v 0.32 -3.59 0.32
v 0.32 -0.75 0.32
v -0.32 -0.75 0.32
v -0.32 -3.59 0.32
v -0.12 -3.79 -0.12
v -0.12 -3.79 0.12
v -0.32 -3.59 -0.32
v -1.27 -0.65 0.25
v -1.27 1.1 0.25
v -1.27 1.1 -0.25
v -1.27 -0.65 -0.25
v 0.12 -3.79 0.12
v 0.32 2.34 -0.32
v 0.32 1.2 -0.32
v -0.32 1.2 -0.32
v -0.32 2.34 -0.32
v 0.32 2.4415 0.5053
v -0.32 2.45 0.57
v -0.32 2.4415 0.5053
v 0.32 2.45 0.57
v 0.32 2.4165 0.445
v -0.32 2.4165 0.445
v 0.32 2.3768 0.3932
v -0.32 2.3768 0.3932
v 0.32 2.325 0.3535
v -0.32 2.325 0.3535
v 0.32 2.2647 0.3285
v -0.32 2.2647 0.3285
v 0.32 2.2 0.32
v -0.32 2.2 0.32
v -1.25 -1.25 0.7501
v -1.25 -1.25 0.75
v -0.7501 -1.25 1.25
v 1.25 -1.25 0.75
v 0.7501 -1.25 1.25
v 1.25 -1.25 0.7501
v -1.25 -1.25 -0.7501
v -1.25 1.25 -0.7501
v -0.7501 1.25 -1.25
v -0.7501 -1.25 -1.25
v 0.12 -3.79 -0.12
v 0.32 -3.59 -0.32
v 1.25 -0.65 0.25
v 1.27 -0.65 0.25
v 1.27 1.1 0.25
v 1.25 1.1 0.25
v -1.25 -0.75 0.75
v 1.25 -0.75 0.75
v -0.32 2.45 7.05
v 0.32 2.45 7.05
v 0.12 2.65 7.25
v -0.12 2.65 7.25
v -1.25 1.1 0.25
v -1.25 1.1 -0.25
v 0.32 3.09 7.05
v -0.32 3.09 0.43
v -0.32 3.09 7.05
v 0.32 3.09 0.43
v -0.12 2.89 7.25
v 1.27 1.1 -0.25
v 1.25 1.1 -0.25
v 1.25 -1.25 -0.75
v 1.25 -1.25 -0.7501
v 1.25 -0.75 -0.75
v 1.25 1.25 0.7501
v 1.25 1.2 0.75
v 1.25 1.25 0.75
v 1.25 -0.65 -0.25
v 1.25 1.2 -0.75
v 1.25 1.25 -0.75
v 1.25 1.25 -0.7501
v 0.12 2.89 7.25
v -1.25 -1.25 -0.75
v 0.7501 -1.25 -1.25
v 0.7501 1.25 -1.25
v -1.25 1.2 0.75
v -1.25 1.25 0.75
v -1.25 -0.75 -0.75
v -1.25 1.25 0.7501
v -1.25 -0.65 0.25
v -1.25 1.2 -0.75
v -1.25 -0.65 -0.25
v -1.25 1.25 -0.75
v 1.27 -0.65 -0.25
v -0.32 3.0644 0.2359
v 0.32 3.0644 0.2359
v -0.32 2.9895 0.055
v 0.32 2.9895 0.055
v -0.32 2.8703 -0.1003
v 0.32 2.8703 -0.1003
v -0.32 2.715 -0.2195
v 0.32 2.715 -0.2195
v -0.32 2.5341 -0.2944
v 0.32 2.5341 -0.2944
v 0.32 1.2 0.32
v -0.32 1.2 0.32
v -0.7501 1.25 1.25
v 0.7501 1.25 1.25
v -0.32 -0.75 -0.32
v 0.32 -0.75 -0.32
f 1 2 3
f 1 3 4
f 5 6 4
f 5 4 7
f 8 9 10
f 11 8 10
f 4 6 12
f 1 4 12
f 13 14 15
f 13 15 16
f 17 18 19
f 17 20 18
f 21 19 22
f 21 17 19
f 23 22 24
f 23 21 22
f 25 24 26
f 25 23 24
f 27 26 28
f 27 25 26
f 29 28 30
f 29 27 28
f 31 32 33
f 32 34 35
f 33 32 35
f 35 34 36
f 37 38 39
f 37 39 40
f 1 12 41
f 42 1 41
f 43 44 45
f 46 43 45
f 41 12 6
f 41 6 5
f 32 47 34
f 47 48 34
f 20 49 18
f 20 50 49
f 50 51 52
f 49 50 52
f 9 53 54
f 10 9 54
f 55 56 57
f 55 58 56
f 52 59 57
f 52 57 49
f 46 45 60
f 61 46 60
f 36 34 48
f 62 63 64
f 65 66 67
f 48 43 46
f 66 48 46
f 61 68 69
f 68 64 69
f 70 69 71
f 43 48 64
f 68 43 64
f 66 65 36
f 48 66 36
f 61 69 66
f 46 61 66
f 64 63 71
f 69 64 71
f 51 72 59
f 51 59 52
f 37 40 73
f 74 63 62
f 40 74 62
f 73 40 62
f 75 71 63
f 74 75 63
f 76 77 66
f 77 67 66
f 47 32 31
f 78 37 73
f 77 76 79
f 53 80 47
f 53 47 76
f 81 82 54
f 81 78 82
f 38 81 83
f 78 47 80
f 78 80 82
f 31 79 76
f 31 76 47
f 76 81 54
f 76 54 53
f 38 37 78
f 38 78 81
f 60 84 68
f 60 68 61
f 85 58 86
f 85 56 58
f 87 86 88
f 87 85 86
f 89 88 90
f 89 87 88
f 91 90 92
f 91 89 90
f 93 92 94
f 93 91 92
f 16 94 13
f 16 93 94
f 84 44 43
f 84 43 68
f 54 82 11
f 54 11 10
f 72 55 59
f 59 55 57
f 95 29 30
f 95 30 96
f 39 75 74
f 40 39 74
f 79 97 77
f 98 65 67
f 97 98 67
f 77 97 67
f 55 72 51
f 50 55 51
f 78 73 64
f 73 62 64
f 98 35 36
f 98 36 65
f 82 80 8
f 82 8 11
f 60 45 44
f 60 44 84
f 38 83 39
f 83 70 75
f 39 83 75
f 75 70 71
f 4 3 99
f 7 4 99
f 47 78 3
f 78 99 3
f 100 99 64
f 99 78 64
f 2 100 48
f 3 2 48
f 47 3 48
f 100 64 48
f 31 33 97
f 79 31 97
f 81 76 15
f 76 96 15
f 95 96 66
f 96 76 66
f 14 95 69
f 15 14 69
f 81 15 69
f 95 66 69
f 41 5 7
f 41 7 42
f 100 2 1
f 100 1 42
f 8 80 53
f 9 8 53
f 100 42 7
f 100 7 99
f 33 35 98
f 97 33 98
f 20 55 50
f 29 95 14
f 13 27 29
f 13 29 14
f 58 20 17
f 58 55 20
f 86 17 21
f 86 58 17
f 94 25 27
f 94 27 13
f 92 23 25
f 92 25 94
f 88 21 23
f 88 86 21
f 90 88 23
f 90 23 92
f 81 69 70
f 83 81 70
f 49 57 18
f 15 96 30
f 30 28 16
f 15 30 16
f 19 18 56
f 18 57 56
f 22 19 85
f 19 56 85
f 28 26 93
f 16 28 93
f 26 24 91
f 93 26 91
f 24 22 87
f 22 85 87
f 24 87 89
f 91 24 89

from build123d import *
from OCP.BRepFilletAPI import BRepFilletAPI_MakeFillet

# Parameters (mm, degrees)
BOSS_EXTRUDE1_DEPTH = 0.32
FILLET1_R1          = 0.75
FILLET1_R2          = 0.25
BOSS_EXTRUDE3_DEPTH = 1.25
CHAMFER1_SIZE       = 0.5
SKETCH3_W           = 0.5
SKETCH3_H           = 1.75
BOSS_EXTRUDE4_DEPTH = 1.27
CHAMFER2_SIZE       = 0.2


with BuildPart() as part:
    # Sketch1 → Boss-Extrude1 (new, symmetric)
    with BuildSketch(Plane(origin=(0, 0, 0), x_dir=(0, 0, -1), z_dir=(1, 0, 0))):
        Polygon((-7.25, 2.45), (-0.32, 2.45), (-0.32, -3.79), (0.32, -3.79), (0.32, 3.09), (-7.25, 3.09), align=None)
    extrude(amount=BOSS_EXTRUDE1_DEPTH, both=True)

    # Fillet1: one fillet with a radius per group of edges: ONE call of the kernel's fillet builder (fillet() takes one radius for all edges)
    fillet1_edges_1 = [part.edges().sort_by_distance(p)[0] for p in [
        (0, 3.09, -0.32),
    ]]
    fillet1_edges_2 = [part.edges().sort_by_distance(p)[0] for p in [
        (0, 2.45, 0.32),
    ]]
    fillet1 = BRepFilletAPI_MakeFillet(part.part.solid().wrapped)
    for e in fillet1_edges_1:
        fillet1.Add(FILLET1_R1, e.wrapped)
    for e in fillet1_edges_2:
        fillet1.Add(FILLET1_R2, e.wrapped)
    add(Compound.cast(fillet1.Shape()), mode=Mode.REPLACE)

    # Sketch2 → Boss-Extrude3 (add, symmetric)
    with BuildSketch(Plane(origin=(0, 0, 0), x_dir=(0, -1, 0), z_dir=(1, 0, 0))):
        Polygon((-1.25, 1.25), (1.25, 1.25), (1.25, 0.75), (0.75, 0.75), (0.75, -0.75), (1.25, -0.75), (1.25, -1.25), (-1.25, -1.25), (-1.25, -0.75), (-1.2, -0.75), (-1.2, 0.75), (-1.25, 0.75), align=None)
    extrude(amount=BOSS_EXTRUDE3_DEPTH, both=True)

    # Chamfer1
    chamfer1_edges = [part.edges().sort_by_distance(p)[0] for p in [
        (1.25, 0, 1.25),
        (1.25, 0, -1.25),
        (-1.25, 0, 1.25),
        (-1.25, 0, -1.25),
    ]]
    chamfer(chamfer1_edges, length=CHAMFER1_SIZE - 0.0001)  # a hair under: the kernel refuses the full size

    # Sketch3 → Boss-Extrude4 (add, symmetric)
    with BuildSketch(Plane(origin=(0, 0, 0), x_dir=(0, 0, -1), z_dir=(1, 0, 0))):
        with Locations((0, 0.225)):
            Rectangle(SKETCH3_W, SKETCH3_H)
    extrude(amount=BOSS_EXTRUDE4_DEPTH, both=True)

    # Chamfer2
    chamfer2_edges = [part.edges().sort_by_distance(p)[0] for p in [
        (0, 3.09, 7.25),
        (0, -3.79, -0.32),
        (0, -3.79, 0.32),
        (0, 2.45, 7.25),
        (0.32, -3.79, 0),
        (0.32, 2.77, 7.25),
        (-0.32, -3.79, 0),
        (-0.32, 2.77, 7.25),
    ]]
    chamfer(chamfer2_edges, length=CHAMFER2_SIZE)


solid = part.part
